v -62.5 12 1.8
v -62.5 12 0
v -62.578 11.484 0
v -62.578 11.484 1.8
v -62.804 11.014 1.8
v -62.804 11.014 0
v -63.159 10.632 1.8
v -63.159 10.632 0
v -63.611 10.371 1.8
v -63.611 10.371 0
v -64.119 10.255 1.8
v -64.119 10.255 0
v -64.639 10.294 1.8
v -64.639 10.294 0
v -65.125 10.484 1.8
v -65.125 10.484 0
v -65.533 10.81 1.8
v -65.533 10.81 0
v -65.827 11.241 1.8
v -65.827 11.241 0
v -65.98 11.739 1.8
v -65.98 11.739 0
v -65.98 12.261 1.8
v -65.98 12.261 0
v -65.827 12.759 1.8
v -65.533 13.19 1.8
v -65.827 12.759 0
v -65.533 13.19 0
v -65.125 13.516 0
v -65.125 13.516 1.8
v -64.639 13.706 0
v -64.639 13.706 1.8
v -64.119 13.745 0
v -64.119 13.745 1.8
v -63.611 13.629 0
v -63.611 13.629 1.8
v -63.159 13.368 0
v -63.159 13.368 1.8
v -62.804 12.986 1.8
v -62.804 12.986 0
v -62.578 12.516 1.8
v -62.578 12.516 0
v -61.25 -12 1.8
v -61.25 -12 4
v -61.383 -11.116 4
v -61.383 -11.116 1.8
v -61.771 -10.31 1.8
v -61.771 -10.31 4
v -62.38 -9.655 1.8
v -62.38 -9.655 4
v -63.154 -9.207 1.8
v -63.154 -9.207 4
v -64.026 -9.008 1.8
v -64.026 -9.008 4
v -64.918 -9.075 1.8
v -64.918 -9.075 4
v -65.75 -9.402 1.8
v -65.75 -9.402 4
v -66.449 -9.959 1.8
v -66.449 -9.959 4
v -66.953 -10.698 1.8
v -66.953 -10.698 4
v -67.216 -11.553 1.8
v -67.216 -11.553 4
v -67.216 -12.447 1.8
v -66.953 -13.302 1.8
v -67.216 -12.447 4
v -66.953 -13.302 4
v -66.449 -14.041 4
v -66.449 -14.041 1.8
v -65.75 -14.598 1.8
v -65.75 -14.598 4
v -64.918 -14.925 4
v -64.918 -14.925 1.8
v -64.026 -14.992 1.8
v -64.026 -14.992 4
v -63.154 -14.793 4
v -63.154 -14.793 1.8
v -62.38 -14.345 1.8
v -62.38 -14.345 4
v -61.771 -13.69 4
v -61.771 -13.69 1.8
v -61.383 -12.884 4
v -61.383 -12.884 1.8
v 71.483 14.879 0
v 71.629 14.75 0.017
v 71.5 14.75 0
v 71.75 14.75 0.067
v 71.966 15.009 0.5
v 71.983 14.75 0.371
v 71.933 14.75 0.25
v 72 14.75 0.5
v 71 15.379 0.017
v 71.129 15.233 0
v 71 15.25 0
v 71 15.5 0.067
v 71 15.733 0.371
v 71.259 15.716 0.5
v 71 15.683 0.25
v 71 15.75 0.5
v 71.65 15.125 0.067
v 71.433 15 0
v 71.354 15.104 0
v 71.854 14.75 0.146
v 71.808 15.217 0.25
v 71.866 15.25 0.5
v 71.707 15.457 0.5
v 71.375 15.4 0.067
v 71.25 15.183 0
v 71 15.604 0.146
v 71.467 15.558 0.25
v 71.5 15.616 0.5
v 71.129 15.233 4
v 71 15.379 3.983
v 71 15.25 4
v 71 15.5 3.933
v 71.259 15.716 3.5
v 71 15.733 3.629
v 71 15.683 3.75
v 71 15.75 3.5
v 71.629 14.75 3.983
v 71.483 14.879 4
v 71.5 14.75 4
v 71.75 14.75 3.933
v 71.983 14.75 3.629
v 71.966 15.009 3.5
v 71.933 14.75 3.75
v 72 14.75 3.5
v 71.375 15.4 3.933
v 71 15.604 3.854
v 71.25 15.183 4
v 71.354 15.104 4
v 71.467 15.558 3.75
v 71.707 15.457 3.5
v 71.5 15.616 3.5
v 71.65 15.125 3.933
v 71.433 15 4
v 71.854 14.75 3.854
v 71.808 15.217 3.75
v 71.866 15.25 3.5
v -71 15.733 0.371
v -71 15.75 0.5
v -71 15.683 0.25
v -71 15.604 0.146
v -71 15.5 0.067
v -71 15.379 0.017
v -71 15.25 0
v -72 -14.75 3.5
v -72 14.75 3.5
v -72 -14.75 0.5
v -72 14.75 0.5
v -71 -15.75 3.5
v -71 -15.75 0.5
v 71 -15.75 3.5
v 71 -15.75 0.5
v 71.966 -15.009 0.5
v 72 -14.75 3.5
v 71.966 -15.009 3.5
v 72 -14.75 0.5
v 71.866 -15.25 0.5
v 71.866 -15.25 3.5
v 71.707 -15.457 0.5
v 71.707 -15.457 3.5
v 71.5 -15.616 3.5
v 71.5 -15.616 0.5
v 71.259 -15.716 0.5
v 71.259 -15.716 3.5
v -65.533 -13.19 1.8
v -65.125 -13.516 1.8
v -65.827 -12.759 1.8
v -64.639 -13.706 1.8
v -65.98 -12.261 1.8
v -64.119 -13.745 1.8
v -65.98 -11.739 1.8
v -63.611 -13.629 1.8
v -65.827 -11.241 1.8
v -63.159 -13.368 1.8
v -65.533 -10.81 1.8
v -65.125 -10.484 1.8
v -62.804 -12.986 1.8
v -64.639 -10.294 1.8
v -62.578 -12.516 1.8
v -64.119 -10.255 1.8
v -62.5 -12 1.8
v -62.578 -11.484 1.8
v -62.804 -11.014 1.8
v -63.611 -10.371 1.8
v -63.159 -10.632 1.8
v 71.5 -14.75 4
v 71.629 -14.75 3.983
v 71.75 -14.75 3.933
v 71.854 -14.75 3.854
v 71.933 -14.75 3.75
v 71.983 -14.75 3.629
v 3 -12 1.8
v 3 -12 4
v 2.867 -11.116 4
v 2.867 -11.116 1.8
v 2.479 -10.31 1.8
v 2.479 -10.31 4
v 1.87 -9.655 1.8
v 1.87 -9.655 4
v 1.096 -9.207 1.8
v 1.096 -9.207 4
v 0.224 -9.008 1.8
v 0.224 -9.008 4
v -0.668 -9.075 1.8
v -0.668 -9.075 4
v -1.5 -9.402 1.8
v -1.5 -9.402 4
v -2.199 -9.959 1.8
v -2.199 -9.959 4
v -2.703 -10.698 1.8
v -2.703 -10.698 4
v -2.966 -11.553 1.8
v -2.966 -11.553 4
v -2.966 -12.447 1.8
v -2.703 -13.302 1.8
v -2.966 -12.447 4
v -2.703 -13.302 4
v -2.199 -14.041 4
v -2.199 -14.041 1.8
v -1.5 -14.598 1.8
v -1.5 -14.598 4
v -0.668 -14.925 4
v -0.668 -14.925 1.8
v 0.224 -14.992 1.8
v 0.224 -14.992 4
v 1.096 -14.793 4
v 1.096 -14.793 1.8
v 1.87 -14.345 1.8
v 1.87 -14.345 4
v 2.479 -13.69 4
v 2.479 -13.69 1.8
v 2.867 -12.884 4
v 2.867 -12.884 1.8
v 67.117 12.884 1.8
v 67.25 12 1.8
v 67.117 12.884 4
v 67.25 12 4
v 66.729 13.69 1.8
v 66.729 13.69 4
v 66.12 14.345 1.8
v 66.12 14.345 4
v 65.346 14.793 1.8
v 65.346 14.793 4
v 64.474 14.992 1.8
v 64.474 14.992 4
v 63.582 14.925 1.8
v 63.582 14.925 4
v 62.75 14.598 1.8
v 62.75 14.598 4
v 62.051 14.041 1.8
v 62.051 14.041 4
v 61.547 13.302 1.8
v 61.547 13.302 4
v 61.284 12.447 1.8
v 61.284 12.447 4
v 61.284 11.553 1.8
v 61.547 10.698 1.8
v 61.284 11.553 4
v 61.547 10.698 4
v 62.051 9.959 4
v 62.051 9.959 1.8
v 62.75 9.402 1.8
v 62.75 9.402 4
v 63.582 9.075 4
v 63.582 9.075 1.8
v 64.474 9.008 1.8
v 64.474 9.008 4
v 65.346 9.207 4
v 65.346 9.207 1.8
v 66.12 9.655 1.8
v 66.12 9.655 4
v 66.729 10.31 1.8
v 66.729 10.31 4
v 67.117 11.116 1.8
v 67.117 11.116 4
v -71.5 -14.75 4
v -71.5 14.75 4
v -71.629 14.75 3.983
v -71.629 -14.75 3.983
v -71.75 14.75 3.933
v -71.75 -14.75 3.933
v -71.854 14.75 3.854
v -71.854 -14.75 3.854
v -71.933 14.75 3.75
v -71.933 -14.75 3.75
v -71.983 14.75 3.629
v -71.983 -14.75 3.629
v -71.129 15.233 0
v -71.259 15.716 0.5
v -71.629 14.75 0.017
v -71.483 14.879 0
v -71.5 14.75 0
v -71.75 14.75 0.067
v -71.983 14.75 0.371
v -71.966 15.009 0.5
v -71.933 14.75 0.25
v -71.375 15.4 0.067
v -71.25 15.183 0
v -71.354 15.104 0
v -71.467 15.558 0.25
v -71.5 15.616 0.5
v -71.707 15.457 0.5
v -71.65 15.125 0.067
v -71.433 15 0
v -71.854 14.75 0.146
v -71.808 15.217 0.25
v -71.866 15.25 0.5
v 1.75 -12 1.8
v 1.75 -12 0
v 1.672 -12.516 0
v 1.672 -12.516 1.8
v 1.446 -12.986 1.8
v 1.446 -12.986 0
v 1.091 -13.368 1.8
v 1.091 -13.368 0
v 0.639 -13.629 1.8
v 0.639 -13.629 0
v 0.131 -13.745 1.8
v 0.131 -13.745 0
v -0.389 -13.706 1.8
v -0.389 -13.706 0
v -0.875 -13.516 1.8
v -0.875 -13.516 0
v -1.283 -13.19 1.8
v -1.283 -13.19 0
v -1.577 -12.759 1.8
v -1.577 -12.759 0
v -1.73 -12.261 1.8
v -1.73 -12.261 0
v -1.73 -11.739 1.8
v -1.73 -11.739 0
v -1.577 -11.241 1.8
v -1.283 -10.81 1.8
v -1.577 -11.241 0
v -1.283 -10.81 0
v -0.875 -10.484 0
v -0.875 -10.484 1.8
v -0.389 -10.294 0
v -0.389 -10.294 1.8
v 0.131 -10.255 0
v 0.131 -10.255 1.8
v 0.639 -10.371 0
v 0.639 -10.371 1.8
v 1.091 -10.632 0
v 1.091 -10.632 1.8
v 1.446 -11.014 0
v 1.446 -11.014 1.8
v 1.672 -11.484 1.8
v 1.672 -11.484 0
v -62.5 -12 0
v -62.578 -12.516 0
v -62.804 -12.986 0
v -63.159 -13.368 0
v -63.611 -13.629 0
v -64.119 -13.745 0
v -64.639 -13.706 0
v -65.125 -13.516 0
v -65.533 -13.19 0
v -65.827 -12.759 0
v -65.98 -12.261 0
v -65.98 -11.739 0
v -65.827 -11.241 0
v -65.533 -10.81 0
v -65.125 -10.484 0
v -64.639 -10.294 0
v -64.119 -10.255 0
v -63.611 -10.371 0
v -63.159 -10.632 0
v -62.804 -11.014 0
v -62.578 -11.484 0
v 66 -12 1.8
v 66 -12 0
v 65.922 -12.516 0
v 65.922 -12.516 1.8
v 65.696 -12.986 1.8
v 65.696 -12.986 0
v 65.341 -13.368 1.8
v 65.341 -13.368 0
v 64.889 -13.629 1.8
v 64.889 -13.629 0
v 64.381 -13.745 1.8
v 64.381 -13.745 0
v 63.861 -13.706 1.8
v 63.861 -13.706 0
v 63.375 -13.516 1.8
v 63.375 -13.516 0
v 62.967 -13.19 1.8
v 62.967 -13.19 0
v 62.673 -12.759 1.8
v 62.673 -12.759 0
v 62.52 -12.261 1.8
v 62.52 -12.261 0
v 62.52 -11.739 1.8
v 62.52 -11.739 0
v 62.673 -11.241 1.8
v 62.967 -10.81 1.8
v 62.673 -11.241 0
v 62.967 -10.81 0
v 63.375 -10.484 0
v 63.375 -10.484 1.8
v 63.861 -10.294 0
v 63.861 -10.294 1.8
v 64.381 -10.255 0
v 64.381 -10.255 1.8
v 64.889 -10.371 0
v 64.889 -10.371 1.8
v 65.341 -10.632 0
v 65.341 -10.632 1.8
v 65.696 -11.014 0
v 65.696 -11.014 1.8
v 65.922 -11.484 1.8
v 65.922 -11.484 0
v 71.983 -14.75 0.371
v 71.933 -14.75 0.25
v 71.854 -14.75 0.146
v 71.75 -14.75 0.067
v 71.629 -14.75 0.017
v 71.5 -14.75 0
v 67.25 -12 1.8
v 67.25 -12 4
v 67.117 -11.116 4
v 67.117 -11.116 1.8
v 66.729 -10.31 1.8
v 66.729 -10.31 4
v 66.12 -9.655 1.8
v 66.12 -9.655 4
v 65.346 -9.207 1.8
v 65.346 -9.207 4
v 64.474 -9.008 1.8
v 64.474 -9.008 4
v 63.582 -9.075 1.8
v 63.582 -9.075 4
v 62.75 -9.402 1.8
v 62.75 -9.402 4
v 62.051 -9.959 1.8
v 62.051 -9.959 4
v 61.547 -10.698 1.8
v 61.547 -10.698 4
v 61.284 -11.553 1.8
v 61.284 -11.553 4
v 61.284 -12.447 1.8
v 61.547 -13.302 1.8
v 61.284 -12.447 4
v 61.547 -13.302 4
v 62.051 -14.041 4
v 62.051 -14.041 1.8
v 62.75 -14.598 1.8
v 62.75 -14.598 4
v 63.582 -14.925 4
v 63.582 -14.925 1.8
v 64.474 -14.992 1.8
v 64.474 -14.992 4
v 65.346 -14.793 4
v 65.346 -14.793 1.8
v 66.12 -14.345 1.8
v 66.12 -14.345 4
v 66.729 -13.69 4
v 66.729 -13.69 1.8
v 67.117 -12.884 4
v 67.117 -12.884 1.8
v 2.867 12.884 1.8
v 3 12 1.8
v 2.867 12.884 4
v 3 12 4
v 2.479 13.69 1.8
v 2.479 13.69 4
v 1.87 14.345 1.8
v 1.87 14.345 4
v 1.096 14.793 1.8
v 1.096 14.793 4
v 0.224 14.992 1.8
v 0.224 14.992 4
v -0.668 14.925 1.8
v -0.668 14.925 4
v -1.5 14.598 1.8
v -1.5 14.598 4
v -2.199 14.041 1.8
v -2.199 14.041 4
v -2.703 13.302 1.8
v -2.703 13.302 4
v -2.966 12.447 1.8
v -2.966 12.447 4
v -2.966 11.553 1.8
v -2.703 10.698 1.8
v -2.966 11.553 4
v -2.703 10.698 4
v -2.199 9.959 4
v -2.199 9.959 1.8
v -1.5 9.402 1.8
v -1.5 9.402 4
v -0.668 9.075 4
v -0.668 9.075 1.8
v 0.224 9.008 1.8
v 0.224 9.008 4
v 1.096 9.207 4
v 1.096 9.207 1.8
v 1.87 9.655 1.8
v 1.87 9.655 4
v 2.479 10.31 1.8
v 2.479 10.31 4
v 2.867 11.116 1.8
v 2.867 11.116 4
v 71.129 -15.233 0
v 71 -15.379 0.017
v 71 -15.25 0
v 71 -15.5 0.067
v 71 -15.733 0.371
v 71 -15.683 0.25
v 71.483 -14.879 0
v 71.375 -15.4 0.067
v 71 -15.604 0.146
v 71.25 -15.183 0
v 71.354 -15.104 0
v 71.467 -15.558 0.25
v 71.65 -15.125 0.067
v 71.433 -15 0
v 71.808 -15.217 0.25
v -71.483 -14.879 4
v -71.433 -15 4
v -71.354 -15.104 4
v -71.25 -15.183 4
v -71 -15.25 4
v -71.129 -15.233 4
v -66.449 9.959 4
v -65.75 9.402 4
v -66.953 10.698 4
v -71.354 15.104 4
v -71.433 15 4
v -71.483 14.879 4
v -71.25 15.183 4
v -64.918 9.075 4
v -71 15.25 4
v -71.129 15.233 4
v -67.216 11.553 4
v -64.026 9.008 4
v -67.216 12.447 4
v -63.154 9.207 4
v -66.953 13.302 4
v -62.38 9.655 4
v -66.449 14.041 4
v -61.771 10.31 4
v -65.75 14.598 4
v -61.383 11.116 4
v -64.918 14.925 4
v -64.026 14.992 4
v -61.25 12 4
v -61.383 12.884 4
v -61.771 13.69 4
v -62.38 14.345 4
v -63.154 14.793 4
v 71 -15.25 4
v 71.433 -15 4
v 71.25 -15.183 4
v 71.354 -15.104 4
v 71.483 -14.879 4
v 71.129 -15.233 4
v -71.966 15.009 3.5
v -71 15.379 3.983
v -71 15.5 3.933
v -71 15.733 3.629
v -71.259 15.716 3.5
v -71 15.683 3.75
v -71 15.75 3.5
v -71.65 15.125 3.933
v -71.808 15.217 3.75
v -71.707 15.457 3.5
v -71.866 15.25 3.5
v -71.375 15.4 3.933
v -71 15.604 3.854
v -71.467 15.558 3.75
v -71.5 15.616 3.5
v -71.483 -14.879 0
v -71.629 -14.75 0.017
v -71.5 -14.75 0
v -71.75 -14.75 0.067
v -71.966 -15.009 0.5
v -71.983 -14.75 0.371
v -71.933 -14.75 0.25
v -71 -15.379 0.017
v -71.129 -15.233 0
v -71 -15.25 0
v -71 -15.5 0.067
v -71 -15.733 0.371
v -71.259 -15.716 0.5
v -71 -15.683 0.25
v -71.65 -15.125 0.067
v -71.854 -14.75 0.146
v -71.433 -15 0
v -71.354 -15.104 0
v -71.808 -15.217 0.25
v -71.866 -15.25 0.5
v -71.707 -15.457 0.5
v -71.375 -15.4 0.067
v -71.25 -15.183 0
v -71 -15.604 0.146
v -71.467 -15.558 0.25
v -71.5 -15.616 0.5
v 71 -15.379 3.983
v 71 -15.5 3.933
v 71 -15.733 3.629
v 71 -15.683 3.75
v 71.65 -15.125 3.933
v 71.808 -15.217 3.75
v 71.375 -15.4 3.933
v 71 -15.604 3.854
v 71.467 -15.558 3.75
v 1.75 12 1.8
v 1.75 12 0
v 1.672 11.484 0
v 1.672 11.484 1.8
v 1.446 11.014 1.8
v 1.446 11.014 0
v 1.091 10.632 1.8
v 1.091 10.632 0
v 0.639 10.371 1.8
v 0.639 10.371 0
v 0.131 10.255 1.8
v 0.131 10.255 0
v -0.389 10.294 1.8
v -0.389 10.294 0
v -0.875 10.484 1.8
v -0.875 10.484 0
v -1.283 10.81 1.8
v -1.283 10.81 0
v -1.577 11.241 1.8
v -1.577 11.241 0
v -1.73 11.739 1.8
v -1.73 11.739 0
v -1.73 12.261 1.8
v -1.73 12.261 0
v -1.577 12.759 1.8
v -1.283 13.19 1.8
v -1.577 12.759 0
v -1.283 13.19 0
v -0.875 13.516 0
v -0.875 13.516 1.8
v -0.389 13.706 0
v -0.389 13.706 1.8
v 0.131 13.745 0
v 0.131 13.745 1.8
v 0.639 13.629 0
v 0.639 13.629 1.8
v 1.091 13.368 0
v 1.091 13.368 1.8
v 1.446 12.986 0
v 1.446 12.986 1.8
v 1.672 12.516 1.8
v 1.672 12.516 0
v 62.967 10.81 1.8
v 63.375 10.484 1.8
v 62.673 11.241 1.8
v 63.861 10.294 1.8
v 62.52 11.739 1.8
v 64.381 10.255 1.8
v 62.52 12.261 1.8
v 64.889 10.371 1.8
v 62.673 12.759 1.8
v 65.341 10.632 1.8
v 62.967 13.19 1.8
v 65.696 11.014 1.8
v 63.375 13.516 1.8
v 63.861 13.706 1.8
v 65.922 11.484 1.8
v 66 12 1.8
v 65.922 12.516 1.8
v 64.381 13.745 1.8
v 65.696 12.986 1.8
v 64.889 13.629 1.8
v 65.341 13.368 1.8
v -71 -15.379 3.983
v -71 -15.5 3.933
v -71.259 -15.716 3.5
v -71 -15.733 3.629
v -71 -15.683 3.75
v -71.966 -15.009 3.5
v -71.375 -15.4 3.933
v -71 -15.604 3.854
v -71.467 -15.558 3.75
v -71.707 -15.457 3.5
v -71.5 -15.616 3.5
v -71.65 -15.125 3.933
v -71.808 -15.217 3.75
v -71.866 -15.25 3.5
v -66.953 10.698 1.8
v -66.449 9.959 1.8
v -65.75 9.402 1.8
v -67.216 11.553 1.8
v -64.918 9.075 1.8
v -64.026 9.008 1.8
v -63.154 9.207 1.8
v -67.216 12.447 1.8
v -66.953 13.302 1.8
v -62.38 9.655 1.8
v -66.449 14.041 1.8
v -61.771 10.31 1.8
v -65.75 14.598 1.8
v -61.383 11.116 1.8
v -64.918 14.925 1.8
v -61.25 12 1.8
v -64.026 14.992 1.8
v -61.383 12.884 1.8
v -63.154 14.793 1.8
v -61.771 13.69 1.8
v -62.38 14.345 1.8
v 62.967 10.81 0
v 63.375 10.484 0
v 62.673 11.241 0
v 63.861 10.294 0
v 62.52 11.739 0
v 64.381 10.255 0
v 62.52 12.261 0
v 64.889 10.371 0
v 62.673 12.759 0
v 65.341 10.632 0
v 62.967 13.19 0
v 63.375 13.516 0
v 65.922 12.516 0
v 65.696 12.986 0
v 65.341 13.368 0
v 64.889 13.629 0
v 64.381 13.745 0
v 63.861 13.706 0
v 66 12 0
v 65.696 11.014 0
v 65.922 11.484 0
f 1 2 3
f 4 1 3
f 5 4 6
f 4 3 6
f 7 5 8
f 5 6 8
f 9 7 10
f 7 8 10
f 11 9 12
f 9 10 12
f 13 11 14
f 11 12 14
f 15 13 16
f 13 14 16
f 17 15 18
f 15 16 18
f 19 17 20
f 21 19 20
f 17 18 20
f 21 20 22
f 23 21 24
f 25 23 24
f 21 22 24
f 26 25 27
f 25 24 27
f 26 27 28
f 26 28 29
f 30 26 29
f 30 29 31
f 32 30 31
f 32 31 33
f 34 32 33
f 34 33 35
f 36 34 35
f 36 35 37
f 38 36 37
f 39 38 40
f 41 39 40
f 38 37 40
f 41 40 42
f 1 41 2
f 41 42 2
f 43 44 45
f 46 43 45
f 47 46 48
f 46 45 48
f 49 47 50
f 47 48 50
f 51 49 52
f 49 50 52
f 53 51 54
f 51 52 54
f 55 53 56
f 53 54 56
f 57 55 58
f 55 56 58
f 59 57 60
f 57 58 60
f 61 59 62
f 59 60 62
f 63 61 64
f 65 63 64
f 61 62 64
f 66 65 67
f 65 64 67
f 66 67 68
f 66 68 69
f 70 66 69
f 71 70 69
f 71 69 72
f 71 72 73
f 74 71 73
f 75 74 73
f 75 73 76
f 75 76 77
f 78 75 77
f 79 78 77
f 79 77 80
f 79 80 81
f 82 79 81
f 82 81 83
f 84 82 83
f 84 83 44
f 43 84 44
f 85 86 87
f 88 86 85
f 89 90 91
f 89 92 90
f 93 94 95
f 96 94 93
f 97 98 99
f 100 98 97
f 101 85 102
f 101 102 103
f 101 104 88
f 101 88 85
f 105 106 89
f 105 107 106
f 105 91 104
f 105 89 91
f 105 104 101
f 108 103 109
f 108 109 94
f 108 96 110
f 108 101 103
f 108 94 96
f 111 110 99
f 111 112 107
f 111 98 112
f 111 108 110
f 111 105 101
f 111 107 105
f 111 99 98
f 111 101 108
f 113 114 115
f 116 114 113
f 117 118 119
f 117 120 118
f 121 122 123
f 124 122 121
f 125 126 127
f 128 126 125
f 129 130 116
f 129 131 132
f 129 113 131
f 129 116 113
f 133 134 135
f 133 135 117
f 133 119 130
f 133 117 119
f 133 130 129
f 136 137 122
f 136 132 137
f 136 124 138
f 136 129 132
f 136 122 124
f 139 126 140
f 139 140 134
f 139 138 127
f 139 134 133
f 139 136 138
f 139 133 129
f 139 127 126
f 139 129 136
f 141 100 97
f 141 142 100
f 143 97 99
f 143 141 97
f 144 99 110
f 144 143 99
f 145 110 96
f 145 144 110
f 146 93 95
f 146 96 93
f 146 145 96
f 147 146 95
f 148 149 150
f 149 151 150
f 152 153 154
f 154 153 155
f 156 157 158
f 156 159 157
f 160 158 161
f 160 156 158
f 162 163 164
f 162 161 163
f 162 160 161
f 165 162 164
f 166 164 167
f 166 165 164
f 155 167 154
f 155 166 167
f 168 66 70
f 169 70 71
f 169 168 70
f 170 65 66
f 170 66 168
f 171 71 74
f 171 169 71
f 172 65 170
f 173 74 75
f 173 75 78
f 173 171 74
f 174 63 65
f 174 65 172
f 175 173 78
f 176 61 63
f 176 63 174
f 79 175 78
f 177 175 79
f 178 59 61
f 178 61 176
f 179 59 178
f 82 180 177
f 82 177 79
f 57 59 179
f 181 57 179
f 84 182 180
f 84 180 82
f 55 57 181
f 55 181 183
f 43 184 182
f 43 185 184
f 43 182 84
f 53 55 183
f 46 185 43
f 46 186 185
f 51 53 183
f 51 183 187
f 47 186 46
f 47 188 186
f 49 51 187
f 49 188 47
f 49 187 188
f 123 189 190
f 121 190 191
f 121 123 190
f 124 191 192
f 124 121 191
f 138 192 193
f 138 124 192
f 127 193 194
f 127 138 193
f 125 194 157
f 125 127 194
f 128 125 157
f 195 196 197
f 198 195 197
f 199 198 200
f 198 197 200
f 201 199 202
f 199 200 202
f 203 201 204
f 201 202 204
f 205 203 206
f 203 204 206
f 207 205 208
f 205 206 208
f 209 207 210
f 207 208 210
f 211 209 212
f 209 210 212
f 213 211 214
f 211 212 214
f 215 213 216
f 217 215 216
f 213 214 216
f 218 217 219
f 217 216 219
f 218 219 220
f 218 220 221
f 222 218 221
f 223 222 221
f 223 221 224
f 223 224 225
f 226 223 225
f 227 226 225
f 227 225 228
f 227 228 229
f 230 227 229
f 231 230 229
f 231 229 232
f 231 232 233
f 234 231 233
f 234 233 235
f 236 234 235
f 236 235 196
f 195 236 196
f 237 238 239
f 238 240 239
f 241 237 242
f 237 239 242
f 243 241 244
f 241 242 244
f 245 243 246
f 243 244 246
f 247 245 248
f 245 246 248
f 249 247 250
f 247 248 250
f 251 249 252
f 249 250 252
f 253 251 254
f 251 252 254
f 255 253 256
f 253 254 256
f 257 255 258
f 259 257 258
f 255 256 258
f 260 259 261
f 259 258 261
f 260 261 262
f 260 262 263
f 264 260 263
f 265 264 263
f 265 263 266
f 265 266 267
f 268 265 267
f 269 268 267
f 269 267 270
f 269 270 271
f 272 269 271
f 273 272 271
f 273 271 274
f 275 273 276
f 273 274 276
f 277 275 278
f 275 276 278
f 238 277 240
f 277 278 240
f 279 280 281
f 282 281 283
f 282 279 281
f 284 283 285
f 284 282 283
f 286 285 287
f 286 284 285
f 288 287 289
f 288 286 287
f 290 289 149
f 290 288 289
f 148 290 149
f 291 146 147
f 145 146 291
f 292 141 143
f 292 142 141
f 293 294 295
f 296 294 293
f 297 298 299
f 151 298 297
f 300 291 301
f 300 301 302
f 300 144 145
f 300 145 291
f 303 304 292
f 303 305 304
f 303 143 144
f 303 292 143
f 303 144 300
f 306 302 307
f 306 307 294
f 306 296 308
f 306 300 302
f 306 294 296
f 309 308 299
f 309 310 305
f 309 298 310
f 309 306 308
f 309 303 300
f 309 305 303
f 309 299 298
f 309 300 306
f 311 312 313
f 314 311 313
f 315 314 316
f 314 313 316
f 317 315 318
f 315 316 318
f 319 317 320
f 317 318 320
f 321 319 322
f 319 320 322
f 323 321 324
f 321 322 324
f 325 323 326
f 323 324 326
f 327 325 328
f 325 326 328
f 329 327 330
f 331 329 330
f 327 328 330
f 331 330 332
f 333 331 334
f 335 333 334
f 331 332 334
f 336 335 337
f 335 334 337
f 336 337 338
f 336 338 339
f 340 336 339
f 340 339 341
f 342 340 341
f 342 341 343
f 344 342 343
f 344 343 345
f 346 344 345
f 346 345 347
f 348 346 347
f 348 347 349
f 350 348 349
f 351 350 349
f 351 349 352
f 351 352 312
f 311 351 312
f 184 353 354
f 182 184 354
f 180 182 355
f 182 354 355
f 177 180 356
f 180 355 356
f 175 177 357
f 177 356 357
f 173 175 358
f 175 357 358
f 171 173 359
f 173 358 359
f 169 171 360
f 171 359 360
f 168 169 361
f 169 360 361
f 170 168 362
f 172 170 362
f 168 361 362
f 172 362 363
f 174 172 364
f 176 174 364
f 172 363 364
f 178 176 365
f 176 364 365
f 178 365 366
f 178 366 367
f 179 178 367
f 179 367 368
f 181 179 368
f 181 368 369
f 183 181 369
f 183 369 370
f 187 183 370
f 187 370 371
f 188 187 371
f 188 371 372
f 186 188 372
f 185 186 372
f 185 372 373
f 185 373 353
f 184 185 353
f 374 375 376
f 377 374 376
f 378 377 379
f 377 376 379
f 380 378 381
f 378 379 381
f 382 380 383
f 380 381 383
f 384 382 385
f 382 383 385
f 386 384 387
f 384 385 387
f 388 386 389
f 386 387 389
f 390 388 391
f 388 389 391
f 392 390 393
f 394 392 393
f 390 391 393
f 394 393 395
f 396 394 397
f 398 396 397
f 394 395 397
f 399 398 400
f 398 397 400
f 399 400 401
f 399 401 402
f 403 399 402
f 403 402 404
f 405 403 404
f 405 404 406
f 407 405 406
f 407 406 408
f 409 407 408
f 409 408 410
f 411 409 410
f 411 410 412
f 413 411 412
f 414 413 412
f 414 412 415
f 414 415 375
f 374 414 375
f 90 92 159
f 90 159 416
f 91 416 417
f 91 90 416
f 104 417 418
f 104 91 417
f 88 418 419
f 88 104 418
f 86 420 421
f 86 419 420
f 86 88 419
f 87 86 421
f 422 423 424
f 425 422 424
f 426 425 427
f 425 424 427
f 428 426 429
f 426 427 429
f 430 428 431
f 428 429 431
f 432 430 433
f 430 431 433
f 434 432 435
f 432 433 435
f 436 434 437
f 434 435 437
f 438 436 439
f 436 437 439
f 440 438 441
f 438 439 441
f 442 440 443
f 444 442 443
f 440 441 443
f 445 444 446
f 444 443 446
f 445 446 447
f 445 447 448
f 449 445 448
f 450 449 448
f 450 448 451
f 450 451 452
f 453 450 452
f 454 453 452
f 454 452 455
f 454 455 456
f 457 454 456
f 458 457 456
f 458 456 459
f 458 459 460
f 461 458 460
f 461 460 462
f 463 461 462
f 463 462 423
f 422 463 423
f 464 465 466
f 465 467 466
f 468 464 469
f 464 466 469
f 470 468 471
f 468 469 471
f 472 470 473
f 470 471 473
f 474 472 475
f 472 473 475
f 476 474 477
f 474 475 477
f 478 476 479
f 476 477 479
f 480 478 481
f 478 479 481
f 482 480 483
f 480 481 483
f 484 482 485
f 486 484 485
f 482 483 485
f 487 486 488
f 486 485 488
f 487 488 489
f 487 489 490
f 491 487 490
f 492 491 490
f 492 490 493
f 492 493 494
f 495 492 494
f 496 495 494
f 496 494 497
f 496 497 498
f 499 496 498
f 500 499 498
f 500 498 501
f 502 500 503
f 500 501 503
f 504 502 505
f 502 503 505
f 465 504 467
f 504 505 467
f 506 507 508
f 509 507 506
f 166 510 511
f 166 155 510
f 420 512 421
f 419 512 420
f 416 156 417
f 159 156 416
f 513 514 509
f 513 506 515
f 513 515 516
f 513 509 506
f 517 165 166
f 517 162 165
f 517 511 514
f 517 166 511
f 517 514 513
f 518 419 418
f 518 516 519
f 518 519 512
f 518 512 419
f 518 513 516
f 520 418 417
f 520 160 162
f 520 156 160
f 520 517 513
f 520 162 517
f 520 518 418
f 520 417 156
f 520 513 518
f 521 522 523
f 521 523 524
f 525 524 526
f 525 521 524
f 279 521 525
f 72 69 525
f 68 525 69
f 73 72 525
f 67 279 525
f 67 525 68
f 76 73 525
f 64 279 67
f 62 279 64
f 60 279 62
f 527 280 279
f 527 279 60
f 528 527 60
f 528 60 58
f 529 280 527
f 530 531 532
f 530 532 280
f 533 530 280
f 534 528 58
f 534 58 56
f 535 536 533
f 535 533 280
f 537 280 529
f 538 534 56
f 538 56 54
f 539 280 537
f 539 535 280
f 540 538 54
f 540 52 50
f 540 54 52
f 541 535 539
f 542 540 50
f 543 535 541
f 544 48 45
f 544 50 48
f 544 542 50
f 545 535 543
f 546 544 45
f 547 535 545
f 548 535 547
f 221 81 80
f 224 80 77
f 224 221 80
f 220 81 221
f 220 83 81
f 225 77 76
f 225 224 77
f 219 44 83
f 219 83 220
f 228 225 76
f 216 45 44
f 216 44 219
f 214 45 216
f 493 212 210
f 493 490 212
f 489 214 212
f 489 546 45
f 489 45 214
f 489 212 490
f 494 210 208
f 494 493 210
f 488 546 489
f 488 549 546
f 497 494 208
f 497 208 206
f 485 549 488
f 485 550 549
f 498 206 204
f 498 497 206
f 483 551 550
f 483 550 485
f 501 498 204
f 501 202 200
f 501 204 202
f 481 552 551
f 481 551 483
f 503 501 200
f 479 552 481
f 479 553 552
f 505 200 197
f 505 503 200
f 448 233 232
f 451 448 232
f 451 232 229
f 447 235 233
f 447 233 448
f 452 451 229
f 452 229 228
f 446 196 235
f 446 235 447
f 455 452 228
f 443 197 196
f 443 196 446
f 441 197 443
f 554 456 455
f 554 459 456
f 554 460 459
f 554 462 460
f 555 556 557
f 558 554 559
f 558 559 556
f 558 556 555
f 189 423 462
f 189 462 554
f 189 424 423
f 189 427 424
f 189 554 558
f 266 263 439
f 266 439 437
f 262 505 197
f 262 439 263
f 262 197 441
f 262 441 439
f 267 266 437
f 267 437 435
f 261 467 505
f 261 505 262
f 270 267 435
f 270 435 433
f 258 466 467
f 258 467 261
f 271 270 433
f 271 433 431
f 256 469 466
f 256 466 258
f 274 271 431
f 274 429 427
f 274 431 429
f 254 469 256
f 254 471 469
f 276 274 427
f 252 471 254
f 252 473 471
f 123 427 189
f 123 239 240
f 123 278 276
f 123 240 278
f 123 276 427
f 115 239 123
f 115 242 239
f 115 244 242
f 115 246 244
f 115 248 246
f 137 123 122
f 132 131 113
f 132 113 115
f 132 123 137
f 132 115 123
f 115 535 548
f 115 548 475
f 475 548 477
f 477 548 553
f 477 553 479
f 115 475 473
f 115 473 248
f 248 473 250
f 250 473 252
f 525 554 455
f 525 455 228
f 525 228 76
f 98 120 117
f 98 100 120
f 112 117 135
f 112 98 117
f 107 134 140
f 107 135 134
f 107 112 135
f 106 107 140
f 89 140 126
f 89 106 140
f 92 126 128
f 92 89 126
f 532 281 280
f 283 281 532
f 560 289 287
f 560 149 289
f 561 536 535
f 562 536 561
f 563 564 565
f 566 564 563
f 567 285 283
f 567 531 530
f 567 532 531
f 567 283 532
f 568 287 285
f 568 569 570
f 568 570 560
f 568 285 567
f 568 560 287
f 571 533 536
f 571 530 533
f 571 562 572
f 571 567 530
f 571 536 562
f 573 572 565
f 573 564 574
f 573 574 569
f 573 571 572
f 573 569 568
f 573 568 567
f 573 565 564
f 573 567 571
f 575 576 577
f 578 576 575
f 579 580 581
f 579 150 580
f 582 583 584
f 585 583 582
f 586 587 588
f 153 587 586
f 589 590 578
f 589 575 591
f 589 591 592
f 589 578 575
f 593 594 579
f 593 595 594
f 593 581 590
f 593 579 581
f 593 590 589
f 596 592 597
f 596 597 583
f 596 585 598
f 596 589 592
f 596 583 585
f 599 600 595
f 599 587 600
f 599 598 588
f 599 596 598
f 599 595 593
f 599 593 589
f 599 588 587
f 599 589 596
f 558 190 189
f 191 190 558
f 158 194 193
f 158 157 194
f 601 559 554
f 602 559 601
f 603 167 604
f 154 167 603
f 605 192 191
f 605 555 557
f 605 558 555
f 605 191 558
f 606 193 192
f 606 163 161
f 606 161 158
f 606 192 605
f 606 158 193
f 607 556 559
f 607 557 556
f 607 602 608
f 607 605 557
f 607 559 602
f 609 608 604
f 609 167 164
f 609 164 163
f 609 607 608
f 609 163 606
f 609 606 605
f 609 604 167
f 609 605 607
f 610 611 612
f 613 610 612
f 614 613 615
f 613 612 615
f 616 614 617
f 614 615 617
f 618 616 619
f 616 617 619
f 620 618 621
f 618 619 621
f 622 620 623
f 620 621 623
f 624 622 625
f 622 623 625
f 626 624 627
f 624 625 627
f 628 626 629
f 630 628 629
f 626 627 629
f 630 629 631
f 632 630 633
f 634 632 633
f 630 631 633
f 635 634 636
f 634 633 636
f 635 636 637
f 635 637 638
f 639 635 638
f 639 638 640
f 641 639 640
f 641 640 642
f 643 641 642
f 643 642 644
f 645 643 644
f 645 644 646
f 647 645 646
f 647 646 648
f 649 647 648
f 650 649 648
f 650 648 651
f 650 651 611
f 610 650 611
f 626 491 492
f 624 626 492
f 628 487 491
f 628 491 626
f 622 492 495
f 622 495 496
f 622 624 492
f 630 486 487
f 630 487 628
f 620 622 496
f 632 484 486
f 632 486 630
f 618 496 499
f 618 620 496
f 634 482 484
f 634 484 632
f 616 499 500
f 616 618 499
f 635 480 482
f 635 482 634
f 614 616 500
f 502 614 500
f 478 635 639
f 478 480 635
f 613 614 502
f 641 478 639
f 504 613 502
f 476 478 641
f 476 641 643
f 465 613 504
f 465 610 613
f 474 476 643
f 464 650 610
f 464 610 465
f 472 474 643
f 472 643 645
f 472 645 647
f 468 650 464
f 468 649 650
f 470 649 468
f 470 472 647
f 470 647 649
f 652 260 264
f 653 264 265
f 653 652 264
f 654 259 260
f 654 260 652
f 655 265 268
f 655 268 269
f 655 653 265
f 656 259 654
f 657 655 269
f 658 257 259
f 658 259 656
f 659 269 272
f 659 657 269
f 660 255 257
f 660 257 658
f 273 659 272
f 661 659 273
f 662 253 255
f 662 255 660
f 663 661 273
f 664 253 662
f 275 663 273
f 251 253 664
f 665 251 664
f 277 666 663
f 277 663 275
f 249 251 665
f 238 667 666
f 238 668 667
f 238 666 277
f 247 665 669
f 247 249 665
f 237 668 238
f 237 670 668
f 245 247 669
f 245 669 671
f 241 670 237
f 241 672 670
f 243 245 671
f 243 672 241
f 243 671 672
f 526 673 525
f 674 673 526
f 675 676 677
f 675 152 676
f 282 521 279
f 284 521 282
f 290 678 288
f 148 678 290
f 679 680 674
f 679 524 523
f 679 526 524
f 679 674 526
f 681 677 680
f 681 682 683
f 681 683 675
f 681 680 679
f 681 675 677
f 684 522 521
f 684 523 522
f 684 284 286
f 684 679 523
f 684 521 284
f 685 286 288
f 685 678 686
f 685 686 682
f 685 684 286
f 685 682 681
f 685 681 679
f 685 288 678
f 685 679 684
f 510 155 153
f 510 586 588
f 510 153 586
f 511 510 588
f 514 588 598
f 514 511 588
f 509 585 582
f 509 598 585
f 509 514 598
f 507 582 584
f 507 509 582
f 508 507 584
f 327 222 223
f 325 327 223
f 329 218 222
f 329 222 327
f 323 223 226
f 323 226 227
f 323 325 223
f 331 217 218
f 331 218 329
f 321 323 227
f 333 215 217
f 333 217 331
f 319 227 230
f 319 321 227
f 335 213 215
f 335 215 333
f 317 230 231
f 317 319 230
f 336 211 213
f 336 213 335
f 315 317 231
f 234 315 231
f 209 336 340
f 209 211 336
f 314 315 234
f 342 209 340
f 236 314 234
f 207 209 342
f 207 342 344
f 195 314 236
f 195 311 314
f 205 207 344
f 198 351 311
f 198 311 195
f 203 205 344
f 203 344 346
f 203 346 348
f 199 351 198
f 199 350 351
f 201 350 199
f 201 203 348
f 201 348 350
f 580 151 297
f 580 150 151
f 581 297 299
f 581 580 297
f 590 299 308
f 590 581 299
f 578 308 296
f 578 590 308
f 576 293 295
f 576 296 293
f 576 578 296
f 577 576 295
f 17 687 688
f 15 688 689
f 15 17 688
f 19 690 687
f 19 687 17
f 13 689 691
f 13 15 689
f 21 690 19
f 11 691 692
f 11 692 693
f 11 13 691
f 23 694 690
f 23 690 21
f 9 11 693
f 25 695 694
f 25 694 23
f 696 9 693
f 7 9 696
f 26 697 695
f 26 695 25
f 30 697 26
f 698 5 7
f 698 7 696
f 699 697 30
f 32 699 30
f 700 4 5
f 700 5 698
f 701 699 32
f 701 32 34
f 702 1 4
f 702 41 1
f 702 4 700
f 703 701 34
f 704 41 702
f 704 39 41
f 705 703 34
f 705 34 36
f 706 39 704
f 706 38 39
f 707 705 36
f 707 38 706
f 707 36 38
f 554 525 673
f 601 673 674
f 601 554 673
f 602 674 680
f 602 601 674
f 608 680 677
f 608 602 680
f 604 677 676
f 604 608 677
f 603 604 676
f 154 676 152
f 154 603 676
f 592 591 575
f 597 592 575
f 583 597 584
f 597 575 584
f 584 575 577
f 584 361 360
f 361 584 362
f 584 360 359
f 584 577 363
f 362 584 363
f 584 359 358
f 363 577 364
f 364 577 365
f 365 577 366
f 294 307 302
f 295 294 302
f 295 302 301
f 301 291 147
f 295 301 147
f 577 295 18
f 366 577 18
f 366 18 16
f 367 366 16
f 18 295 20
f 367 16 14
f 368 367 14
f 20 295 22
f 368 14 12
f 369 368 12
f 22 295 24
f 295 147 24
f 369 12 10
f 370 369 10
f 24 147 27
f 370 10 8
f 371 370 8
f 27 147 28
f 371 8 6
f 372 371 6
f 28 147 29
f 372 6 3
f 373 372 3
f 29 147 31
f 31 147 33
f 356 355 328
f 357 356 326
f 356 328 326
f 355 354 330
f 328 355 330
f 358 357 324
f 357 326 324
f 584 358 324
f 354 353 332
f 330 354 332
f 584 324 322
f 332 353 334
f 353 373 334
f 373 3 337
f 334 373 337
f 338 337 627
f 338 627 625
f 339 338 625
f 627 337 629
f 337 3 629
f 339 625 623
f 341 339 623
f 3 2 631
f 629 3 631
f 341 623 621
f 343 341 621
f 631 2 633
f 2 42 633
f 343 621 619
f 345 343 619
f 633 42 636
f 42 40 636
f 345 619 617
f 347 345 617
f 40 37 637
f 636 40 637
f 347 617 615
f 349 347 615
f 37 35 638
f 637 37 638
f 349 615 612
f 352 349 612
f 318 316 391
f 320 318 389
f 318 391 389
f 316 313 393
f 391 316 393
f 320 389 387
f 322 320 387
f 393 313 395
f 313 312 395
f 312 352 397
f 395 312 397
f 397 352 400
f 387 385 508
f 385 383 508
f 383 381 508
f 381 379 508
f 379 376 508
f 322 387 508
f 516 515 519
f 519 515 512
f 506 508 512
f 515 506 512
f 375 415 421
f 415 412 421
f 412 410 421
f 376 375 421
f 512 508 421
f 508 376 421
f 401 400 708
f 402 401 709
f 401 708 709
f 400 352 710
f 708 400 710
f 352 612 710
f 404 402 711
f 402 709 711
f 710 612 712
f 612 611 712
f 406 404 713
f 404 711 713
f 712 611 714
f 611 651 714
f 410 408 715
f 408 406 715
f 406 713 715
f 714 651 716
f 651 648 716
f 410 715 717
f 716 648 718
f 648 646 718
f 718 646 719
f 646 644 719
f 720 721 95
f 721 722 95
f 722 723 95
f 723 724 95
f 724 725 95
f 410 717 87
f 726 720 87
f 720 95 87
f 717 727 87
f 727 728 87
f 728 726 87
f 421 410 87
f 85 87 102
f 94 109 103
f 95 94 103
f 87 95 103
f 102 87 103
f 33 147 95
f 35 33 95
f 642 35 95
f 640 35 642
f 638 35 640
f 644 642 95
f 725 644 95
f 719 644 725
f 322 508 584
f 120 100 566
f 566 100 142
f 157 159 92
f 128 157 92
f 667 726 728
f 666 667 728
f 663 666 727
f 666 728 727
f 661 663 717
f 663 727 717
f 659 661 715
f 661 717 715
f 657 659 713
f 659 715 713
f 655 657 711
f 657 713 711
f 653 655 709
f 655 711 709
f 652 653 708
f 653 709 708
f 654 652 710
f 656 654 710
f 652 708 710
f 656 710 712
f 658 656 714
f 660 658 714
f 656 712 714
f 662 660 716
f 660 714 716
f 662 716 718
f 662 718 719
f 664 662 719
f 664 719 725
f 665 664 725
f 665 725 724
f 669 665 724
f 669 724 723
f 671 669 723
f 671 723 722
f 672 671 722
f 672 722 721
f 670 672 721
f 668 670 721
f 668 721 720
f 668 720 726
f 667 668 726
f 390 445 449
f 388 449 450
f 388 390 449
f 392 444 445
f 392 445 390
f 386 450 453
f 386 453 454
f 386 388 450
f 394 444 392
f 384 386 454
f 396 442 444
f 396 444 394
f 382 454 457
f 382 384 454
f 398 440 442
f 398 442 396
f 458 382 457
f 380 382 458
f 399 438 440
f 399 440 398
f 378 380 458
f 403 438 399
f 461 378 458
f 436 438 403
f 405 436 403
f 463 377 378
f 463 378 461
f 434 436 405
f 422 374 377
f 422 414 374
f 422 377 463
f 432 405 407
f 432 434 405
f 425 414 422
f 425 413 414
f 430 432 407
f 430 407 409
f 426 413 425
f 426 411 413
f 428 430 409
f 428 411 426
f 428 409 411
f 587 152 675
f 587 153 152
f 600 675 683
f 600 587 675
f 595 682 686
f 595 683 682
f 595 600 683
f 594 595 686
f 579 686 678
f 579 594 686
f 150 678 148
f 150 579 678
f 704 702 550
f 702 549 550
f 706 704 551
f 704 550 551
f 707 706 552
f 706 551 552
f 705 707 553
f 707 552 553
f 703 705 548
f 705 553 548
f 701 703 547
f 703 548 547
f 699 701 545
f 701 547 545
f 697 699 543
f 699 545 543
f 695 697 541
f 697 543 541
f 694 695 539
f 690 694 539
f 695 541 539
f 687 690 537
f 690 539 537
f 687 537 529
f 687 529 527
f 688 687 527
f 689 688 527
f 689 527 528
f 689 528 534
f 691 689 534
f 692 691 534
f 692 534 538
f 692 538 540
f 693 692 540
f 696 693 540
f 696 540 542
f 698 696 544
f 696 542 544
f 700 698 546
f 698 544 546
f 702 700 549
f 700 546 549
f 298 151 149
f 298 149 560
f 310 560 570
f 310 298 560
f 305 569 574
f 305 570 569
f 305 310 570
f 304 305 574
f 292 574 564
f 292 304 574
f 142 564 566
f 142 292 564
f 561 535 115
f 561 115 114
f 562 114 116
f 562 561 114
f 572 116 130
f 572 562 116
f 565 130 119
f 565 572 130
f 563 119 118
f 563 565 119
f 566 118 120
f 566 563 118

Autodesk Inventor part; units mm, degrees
ref_plane "YZ Plane" through (0, 0, 0) normal (1, 0, 0) x (0, 1, 0)
ref_plane "XZ Plane" through (0, 0, 0) normal (0, 1, 0) x (-1, 0, 0)
ref_plane "XY Plane" through (0, 0, 0) normal (0, 0, 1) x (1, 0, 0)
sketch "Sketch1" plane through (0, 0, 0) normal (0, 0, 1) x (1, 0, 0)
  line L0 (-71, -15.75) -> (71, -15.75)
  line L1 (72, -14.75) -> (72, 14.75)
  line L2 (71, 15.75) -> (-71, 15.75)
  line L3 (-72, 14.75) -> (-72, -14.75)
  line L4 (-72, -15.75) -> (72, 15.75) construction
  line L5 (72, -15.75) -> (-72, 15.75) construction
  line L6 (0, 0) -> (0, 12) construction
  line L7 (0, 12) -> (64.25, 12) construction
  line L8 (0, 12) -> (-64.25, 12) construction
  line L9 (0, 0) -> (34.0768, 0) construction
  circle A0 centre (-64.25, 12) radius 1.75
  circle A1 centre (0, 12) radius 1.75
  circle A2 centre (64.25, 12) radius 1.75
  circle A3 centre (-64.25, -12) radius 1.75
  circle A4 centre (0, -12) radius 1.75
  circle A5 centre (64.25, -12) radius 1.75
  arc A6 (-71, 15.75) -> (-72, 14.75) centre (-71, 14.75) ccw
  arc A7 (72, 14.75) -> (71, 15.75) centre (71, 14.75) ccw
  arc A8 (71, -15.75) -> (72, -14.75) centre (71, -14.75) ccw
  arc A9 (-72, -14.75) -> (-71, -15.75) centre (-71, -14.75) ccw
  dimension "d0" = 144
  dimension "d1" = 31.5
  dimension "d2" = 64.25
  dimension "d3" = 12
  dimension "d4" = 3.5
  dimension "d5" = 1
extrude "Extrusion1" add sketch "Sketch1" along normal blind 4
sketch "Sketch2" plane through (0, 0, 4) normal (0, 0, 1) x (1, 0, 0)
  circle A0 centre (-64.25, 12) radius 1.75 projected
  circle A1 centre (-64.25, 12) radius 3
  circle A2 centre (0, 12) radius 1.75 projected
  circle A3 centre (0, 12) radius 3
  circle A4 centre (64.25, 12) radius 1.75 projected
  circle A5 centre (64.25, 12) radius 3
  circle A6 centre (64.25, -12) radius 1.75 projected
  circle A7 centre (64.25, -12) radius 3
  circle A8 centre (0, -12) radius 1.75 projected
  circle A9 centre (0, -12) radius 3
  circle A10 centre (-64.25, -12) radius 1.75 projected
  circle A11 centre (-64.25, -12) radius 3
  point P0 (0, 0)
  dimension "d8" = 6
extrude "Extrusion2" cut sketch "Sketch2" against normal blind 2.2 contours A0 | A1 | A2 | A3 | A4 | A5 | A6 | A7 | A8 | A9 | A10 | A11
fillet "Fillet1" radius 0.5 16 edges at (-71.7071, 15.4571, 4) (-72, 0, 4) (-71.7071, -15.4571, 4) (0, -15.75, 4) (71.7071, -15.4571, 4) (72, 0, 4) (71.7071, 15.4571, 4) (0, 15.75, 4) (71.7071, -15.4571, 0) (72, 0, 0) (71.7071, 15.4571, 0) (0, 15.75, 0) (-71.7071, 15.4571, 0) (-72, 0, 0) (-71.7071, -15.4571, 0) (0, -15.75, 0)
properties part number "Link2_FlatCover"
